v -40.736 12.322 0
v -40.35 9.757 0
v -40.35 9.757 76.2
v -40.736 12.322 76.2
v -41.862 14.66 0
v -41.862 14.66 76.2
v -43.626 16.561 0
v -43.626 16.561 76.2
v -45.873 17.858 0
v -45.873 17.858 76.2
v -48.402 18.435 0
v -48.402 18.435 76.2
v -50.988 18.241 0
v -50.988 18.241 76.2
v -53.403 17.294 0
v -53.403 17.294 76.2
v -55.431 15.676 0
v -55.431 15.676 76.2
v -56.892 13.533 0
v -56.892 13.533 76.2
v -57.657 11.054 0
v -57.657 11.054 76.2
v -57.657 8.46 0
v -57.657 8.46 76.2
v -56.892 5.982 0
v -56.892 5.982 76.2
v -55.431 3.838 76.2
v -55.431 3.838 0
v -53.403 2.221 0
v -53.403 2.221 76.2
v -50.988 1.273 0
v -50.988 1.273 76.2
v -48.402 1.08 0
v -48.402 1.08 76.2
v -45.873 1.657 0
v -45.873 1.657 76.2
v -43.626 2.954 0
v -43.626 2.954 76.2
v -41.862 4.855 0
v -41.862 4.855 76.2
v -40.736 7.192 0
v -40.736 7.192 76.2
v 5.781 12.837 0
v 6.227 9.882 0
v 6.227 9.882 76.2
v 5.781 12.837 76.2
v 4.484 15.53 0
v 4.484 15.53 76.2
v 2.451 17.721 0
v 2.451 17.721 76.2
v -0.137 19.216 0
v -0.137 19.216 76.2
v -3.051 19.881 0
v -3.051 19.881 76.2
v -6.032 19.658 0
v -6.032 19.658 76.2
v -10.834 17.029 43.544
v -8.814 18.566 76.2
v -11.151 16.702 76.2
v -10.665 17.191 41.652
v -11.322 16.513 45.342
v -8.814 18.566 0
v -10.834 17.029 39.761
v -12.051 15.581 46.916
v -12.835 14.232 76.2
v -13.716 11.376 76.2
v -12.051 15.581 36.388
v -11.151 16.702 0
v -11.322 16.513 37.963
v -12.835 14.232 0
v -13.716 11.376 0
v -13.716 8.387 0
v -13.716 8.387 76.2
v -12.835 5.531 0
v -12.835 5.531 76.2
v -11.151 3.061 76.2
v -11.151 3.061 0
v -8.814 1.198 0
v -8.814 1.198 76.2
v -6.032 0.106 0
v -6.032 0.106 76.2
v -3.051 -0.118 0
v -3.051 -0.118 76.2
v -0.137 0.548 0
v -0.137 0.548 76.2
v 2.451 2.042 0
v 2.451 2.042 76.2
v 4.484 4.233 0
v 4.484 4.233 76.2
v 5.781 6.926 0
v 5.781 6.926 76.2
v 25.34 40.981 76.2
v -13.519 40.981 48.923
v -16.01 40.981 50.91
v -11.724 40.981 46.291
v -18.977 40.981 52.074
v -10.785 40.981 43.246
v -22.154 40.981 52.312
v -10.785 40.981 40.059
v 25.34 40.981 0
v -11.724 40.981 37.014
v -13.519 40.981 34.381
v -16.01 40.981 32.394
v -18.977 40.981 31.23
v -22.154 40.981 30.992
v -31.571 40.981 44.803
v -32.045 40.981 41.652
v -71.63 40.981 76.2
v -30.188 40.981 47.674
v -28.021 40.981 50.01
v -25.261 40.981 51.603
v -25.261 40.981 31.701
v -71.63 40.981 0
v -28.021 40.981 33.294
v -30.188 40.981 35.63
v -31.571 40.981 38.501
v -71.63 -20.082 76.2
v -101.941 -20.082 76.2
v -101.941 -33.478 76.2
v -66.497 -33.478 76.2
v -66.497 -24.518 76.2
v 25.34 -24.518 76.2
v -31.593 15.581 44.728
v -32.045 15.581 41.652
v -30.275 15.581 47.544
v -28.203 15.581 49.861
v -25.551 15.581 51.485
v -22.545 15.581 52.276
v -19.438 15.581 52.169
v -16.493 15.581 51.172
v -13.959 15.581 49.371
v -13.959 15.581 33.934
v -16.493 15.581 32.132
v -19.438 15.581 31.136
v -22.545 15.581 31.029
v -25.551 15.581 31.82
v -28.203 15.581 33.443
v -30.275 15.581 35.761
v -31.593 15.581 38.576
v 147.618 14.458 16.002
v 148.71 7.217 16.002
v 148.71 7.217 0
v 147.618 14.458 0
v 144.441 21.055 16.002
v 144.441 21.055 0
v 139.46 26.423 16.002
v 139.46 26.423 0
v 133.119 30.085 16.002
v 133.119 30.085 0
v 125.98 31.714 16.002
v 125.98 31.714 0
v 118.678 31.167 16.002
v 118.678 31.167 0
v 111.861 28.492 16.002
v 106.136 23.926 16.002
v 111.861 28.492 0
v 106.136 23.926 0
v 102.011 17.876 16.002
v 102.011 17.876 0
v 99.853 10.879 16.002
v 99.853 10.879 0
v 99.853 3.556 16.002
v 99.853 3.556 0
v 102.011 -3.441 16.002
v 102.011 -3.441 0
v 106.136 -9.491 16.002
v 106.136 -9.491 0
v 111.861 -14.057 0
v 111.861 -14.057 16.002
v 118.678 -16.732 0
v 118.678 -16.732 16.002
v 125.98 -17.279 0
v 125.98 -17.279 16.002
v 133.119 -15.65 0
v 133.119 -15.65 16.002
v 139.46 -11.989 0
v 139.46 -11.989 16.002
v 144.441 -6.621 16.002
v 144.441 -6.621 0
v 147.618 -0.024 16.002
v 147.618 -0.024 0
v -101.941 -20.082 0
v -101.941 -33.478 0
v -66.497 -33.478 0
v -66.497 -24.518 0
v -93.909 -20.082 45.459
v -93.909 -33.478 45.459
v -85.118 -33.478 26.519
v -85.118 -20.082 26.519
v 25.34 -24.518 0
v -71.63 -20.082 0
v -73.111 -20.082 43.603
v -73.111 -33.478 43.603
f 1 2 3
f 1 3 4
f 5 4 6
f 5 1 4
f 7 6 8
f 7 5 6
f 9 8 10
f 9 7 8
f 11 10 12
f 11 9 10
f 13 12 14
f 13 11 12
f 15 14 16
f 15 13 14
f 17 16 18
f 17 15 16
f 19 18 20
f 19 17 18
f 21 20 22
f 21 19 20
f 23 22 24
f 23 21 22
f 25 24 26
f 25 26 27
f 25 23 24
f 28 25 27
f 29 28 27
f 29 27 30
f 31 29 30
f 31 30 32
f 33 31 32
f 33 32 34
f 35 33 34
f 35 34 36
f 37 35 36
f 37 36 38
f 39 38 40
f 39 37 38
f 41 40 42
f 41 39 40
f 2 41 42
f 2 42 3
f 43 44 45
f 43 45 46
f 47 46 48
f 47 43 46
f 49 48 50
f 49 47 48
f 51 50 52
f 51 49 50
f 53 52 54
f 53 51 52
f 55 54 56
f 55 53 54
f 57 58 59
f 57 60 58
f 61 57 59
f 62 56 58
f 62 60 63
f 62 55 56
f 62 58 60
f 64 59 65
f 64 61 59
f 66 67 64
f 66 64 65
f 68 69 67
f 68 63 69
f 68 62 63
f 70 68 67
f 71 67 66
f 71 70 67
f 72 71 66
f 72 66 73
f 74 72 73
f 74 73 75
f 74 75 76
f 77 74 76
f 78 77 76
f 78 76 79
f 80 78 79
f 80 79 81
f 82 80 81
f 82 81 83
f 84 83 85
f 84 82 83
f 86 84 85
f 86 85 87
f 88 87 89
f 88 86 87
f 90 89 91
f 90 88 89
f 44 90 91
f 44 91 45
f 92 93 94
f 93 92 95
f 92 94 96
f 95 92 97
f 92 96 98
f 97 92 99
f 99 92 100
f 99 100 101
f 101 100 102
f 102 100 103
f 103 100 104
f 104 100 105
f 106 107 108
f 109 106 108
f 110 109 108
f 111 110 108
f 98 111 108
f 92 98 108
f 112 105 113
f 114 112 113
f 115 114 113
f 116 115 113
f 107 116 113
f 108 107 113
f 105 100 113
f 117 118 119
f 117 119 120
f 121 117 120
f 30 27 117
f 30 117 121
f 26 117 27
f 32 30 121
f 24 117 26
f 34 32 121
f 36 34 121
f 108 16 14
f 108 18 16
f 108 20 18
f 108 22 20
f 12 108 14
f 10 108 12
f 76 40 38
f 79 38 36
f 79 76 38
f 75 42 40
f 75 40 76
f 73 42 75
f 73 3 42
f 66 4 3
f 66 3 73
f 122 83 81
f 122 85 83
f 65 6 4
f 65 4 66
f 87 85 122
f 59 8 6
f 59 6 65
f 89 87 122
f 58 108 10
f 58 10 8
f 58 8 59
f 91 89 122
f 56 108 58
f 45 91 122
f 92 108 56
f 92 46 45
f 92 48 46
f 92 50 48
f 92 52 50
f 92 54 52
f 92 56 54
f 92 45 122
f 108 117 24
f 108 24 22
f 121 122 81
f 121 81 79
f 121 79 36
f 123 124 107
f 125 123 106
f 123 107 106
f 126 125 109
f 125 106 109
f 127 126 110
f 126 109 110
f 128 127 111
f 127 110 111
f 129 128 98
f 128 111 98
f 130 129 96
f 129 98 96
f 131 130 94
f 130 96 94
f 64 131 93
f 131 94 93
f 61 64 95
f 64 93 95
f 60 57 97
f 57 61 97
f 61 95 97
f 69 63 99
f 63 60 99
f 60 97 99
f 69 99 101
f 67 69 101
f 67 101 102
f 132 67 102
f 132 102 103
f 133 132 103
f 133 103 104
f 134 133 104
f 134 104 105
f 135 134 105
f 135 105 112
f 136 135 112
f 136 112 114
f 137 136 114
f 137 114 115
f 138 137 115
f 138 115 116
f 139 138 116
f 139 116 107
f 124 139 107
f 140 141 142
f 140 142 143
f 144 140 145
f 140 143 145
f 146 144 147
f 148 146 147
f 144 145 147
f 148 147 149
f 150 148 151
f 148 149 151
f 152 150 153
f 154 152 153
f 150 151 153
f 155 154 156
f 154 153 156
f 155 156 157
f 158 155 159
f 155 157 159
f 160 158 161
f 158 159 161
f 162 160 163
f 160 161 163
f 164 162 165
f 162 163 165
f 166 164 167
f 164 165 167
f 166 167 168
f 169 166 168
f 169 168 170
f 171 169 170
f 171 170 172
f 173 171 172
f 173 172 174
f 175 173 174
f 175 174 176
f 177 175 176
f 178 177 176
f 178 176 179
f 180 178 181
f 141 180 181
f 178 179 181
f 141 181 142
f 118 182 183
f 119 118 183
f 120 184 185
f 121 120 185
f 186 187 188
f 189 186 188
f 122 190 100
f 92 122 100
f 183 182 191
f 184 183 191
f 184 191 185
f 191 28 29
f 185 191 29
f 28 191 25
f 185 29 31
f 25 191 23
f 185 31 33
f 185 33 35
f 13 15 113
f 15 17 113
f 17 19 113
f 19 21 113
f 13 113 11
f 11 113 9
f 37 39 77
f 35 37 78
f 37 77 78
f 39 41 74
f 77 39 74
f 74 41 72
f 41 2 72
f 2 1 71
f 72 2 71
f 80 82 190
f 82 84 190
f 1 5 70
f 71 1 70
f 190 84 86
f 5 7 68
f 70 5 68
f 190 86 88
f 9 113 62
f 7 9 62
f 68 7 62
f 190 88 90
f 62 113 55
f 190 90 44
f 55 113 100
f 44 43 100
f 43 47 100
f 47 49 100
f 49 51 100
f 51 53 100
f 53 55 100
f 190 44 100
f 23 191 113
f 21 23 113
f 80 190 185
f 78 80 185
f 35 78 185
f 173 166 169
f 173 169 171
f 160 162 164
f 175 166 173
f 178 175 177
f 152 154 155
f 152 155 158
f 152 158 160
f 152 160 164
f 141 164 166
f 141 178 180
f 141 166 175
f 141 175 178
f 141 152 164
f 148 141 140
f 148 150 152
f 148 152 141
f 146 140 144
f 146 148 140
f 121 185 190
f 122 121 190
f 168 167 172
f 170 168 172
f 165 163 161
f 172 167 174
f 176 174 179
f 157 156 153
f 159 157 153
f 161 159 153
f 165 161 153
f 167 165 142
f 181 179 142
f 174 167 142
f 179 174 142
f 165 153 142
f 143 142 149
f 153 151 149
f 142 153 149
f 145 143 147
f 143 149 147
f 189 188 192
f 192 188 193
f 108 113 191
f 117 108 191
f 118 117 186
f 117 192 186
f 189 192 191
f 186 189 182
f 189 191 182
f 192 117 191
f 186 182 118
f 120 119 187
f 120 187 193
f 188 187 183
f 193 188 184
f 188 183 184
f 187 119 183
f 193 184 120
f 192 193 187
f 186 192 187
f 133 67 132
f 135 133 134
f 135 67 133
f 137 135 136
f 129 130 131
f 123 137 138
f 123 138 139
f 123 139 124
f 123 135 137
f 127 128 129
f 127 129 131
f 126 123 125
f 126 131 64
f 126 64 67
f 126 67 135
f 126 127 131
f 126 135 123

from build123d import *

# Parameters (mm, degrees)
F0_R     = 8.702175
F0_R_2   = 10.027362
F1_DEPTH = 76.2
F3_DEPTH = 49.53
F4_R     = 10.690122
F5_DEPTH = 25.4
F6_R     = 24.565439
F7_DEPTH = 16.002


with BuildPart() as f1:
    # F0 (on Top) → F1 (new body)
    with BuildSketch(Plane.XY):
        Polygon((25.339812, 40.98073), (-71.630187, 40.98073), (-71.630187, -20.08239), (-101.940535, -20.08239), (-101.940535, -33.478312), (-66.497155, -33.478312), (-66.497155, -24.517545), (25.339812, -24.517545), align=None)
        with Locations((-49.051825, 9.757455)):
            Circle(F0_R, mode=Mode.SUBTRACT)
        with Locations((-3.800518, 9.881772)):
            Circle(F0_R_2, mode=Mode.SUBTRACT)
    extrude(amount=F1_DEPTH)

    # F2 (on face) → F3 (cut)
    with BuildSketch(Plane.XZ.offset(33.478312)):
        Polygon((-85.117862, 26.518994), (-73.111358, 43.602549), (-93.909402, 45.45871), align=None)
    extrude(amount=-F3_DEPTH, mode=Mode.SUBTRACT)

    # F4 (on face) → F5 (cut)
    with BuildSketch(Plane(origin=(0, 40.98073, 0), x_dir=(-1, 0, 0), z_dir=(0, 1, 0))):
        with Locations((21.355344, 41.652258)):
            Circle(F4_R)
    extrude(amount=-F5_DEPTH, mode=Mode.SUBTRACT)


with BuildPart() as f7:
    # F6 (on Top) → F7 (new body)
    with BuildSketch(Plane.XY):
        with Locations((124.144077, 7.217272)):
            Circle(F6_R)
    extrude(amount=F7_DEPTH)


solid = Compound([f1.part, f7.part])
